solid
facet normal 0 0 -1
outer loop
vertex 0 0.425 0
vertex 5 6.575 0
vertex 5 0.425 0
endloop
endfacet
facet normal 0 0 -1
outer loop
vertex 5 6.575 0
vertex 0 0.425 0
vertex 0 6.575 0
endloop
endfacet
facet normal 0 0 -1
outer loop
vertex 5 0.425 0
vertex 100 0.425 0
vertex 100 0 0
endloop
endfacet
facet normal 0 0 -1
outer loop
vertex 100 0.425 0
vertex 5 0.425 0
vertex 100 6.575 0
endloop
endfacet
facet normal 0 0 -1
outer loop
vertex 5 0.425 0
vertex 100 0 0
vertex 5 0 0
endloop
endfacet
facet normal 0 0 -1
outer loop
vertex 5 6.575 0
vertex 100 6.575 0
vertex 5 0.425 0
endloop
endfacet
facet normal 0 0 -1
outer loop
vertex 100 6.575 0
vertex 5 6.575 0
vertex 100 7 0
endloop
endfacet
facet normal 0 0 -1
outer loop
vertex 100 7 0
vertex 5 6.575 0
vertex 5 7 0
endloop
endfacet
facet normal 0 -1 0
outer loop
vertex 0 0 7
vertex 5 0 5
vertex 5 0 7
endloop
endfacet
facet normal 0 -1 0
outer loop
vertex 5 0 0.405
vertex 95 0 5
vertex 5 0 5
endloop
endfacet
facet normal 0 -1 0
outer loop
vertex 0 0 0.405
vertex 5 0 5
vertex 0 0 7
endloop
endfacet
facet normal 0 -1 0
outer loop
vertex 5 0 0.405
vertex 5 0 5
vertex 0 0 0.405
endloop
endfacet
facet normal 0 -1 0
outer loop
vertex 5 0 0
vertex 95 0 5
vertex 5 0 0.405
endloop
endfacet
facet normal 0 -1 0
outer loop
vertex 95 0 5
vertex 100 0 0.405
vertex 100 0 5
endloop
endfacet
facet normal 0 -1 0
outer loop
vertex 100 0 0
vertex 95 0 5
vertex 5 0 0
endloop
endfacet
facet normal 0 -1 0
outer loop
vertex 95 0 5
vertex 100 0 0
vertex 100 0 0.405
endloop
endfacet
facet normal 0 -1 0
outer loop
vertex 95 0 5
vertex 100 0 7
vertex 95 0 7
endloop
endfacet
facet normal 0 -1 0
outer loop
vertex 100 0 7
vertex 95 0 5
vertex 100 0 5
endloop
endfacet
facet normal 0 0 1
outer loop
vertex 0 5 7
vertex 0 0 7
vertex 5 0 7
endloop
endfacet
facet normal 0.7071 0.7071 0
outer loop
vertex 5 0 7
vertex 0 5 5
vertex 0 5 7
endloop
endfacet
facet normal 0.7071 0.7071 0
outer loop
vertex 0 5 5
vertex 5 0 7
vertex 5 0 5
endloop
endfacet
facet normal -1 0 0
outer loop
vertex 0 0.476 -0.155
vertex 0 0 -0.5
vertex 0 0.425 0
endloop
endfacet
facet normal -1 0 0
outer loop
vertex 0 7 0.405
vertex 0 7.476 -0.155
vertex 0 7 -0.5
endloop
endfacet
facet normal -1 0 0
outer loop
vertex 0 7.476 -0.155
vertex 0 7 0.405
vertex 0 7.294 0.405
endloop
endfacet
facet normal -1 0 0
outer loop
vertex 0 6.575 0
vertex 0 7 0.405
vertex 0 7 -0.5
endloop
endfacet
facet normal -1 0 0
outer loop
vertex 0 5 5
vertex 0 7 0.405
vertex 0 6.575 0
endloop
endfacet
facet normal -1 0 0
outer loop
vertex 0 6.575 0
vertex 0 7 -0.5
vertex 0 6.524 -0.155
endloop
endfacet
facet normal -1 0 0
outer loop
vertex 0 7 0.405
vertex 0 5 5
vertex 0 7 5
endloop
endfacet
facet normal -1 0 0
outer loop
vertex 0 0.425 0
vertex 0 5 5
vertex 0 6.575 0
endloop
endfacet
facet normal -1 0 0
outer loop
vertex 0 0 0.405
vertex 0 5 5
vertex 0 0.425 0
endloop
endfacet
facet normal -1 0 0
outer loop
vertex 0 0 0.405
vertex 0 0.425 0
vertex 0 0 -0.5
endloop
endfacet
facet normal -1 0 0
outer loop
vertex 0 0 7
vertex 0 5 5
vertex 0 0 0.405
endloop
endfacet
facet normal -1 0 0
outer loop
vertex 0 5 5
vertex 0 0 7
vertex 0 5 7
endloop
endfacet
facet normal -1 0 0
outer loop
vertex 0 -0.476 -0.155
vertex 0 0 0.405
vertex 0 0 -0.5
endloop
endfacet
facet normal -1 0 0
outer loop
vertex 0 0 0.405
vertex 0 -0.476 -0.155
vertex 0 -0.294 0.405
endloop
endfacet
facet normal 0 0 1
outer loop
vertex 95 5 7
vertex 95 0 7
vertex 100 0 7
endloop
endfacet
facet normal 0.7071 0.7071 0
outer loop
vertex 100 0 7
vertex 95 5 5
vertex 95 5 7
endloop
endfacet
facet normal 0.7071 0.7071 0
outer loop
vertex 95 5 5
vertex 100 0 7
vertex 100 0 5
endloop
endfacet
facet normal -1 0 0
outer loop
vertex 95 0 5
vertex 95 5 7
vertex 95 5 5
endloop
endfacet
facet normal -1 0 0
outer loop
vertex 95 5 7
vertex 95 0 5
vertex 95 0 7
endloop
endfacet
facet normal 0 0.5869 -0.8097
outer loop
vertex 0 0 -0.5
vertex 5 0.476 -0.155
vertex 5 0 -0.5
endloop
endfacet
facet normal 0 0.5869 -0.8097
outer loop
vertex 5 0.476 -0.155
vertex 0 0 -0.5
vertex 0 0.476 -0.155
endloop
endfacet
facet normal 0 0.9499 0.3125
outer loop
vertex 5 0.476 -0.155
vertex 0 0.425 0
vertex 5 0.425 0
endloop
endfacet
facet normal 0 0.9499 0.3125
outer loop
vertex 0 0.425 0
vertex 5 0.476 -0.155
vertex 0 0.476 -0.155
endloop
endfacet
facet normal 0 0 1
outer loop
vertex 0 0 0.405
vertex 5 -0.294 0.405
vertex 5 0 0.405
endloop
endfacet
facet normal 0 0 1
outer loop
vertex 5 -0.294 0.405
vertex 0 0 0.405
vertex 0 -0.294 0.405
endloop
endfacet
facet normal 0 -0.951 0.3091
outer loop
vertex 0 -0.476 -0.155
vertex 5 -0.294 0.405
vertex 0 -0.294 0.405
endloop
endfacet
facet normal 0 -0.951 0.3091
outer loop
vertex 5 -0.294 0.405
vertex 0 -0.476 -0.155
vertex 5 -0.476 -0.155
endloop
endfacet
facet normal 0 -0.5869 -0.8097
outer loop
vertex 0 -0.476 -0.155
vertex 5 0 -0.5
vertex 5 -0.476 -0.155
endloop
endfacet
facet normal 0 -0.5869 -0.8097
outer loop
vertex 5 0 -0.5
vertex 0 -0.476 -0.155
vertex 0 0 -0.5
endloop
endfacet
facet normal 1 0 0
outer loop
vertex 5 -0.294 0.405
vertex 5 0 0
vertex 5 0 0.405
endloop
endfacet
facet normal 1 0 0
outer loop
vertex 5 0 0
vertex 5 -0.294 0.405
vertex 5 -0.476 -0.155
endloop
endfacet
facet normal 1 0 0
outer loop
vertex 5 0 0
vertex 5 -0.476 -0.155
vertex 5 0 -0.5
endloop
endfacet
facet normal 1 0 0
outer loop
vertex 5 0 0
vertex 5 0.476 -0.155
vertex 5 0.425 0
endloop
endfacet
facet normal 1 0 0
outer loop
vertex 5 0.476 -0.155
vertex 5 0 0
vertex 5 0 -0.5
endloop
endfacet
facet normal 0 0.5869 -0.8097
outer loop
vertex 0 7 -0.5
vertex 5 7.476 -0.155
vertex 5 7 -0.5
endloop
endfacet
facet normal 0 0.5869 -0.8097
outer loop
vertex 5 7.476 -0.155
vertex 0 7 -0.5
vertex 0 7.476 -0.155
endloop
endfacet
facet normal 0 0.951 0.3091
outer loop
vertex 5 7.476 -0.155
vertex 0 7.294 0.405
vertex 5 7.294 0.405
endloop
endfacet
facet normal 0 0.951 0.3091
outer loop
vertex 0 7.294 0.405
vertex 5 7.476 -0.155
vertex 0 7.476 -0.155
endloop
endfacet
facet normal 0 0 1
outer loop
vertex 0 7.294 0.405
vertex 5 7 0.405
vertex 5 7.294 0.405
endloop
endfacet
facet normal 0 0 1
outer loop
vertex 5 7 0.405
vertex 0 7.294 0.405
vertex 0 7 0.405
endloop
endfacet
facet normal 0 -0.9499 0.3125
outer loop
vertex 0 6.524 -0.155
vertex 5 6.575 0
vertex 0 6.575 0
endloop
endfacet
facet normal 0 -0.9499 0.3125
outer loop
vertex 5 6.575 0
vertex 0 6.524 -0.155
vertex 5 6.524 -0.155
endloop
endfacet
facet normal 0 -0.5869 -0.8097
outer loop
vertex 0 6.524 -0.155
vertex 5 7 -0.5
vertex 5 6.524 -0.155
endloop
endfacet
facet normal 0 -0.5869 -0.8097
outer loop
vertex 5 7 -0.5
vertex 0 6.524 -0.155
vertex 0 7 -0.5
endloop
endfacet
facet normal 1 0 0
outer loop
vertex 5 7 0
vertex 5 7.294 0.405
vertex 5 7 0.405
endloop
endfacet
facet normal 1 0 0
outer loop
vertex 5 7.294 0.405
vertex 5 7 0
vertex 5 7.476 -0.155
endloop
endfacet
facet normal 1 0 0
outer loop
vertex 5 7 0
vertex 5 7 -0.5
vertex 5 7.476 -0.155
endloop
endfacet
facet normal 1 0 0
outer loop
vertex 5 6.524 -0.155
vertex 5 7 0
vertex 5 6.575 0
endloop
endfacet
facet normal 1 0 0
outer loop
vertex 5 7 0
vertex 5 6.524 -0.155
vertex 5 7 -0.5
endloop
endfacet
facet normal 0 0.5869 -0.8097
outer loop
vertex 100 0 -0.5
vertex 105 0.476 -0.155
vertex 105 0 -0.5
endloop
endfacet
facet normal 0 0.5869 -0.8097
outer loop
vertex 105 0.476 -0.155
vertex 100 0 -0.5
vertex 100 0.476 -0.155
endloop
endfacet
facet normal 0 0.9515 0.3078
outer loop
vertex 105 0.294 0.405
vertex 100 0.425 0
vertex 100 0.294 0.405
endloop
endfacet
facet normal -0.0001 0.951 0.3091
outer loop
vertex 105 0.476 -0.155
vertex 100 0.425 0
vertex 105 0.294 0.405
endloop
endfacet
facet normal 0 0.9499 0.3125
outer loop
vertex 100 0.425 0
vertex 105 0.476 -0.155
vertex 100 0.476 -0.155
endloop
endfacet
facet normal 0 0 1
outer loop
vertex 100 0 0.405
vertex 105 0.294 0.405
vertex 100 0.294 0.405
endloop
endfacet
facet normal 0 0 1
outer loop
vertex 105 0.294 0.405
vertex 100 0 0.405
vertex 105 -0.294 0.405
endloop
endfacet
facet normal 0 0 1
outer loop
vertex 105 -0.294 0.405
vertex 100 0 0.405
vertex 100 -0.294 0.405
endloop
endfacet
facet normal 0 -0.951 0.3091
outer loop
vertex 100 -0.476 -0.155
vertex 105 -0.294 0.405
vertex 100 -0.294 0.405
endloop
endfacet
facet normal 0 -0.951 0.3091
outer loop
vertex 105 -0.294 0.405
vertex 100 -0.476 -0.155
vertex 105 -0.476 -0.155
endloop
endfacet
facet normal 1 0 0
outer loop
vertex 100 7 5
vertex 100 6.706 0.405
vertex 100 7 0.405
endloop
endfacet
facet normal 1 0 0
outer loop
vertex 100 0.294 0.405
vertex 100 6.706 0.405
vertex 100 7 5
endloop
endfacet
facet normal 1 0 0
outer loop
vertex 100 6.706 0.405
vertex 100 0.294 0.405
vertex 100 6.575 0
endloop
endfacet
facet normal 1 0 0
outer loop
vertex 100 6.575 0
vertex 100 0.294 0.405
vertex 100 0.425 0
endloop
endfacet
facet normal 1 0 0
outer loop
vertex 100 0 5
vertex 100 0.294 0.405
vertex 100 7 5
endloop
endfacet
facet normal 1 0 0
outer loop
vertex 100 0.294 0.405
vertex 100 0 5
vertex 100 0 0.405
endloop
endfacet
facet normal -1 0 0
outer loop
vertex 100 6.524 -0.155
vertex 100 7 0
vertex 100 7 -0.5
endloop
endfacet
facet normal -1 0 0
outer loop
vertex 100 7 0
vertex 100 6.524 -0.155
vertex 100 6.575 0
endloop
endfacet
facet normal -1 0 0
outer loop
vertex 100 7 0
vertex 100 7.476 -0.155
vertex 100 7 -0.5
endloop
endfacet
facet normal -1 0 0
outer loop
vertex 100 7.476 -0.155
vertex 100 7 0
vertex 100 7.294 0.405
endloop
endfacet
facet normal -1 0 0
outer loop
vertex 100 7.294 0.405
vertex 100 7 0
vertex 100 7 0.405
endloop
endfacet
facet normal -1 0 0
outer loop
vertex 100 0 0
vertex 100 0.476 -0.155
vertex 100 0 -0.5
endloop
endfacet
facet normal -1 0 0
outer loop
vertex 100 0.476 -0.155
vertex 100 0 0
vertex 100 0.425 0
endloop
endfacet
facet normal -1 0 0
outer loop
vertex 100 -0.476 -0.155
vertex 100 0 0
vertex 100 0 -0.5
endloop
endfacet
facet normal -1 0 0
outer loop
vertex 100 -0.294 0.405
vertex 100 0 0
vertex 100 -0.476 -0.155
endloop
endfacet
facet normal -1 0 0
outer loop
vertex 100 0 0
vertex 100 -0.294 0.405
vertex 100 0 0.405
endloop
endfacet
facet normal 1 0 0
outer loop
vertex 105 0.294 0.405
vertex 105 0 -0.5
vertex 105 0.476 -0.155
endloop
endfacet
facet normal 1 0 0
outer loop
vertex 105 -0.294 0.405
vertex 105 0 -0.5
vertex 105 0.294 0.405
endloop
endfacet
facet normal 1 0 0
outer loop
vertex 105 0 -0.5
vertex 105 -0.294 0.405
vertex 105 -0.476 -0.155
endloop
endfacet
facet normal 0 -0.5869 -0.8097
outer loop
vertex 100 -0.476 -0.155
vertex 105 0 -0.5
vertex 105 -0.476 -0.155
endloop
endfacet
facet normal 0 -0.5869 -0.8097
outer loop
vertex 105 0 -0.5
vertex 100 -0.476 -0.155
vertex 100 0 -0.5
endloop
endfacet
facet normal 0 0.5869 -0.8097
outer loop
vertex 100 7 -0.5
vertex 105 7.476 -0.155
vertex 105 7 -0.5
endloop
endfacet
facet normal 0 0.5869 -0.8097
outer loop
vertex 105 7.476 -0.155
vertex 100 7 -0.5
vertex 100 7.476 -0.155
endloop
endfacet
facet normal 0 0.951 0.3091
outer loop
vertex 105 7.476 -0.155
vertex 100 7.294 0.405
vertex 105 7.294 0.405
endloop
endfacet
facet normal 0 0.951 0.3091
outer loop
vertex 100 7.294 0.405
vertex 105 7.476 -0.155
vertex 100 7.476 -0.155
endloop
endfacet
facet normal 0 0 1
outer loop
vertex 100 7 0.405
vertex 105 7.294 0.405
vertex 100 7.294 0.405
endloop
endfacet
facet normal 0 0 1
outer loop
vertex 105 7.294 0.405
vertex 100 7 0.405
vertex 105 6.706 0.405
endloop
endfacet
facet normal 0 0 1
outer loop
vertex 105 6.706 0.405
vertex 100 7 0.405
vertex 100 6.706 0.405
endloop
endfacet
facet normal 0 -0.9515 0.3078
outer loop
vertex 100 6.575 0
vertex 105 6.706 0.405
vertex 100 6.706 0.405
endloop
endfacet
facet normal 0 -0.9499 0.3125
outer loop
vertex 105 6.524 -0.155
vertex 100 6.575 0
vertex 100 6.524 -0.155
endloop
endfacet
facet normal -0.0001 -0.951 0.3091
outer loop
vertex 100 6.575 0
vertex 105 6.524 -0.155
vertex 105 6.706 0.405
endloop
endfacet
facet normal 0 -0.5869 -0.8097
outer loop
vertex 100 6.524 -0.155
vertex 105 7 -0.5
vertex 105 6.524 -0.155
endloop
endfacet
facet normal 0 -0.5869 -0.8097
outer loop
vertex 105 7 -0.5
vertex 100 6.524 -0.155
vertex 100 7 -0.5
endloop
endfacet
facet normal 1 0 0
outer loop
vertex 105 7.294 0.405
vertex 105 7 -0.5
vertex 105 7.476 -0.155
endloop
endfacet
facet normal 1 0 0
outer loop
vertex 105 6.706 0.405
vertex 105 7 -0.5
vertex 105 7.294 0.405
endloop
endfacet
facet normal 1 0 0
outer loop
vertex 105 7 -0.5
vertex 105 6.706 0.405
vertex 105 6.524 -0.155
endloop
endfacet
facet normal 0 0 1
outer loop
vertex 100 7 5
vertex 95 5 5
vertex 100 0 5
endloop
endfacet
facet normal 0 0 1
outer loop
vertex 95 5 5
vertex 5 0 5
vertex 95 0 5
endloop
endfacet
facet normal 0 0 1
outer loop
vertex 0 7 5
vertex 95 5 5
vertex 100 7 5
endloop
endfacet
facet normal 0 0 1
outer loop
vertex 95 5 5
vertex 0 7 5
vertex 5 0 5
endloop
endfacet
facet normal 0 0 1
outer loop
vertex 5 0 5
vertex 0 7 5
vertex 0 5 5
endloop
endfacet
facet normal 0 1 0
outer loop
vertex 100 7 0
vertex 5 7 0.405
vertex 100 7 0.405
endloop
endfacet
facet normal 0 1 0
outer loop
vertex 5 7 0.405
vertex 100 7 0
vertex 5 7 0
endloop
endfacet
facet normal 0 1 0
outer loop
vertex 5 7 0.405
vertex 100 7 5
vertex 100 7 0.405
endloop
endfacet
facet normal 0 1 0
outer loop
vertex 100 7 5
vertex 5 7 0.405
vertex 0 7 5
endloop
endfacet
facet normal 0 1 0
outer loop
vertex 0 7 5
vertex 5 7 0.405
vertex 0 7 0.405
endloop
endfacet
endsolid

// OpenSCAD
module linear_guide_rail() {
    rail_body();
    mounting_holes();
    end_chamfers();
    edge_fillets();
    engraved_markings();
}

module rail_body() {
    translate([0, 0, 0])
        cube([100, 7, 5], center = false);
}

module mounting_holes() {
    for (x = [10, 30, 50, 70, 90]) {
        translate([x, 3.5, 2.5])
            rotate([90, 0, 0])
                cylinder(h = 5, r = 1, center = true);
    }
}

module end_chamfers() {
    translate([0, 0, 0])
        linear_extrude(height = 7)
            polygon(points = [[0, 0], [5, 0], [0, 5]]);
    translate([95, 0, 0])
        linear_extrude(height = 7)
            polygon(points = [[0, 0], [5, 0], [0, 5]]);
}

module edge_fillets() {
    for (x = [0, 100]) {
        for (y = [0, 7]) {
            translate([x, y, 0])
                rotate([0, 90, 0])
                    cylinder(h = 5, r = 0.5, center = false);
        }
    }
}

module engraved_markings() {
    translate([50, 3.5, 5.1])
        rotate([0, 0, 0])
            text("Guide Rail", size = 2, valign = "center", halign = "center");
}

linear_guide_rail();
